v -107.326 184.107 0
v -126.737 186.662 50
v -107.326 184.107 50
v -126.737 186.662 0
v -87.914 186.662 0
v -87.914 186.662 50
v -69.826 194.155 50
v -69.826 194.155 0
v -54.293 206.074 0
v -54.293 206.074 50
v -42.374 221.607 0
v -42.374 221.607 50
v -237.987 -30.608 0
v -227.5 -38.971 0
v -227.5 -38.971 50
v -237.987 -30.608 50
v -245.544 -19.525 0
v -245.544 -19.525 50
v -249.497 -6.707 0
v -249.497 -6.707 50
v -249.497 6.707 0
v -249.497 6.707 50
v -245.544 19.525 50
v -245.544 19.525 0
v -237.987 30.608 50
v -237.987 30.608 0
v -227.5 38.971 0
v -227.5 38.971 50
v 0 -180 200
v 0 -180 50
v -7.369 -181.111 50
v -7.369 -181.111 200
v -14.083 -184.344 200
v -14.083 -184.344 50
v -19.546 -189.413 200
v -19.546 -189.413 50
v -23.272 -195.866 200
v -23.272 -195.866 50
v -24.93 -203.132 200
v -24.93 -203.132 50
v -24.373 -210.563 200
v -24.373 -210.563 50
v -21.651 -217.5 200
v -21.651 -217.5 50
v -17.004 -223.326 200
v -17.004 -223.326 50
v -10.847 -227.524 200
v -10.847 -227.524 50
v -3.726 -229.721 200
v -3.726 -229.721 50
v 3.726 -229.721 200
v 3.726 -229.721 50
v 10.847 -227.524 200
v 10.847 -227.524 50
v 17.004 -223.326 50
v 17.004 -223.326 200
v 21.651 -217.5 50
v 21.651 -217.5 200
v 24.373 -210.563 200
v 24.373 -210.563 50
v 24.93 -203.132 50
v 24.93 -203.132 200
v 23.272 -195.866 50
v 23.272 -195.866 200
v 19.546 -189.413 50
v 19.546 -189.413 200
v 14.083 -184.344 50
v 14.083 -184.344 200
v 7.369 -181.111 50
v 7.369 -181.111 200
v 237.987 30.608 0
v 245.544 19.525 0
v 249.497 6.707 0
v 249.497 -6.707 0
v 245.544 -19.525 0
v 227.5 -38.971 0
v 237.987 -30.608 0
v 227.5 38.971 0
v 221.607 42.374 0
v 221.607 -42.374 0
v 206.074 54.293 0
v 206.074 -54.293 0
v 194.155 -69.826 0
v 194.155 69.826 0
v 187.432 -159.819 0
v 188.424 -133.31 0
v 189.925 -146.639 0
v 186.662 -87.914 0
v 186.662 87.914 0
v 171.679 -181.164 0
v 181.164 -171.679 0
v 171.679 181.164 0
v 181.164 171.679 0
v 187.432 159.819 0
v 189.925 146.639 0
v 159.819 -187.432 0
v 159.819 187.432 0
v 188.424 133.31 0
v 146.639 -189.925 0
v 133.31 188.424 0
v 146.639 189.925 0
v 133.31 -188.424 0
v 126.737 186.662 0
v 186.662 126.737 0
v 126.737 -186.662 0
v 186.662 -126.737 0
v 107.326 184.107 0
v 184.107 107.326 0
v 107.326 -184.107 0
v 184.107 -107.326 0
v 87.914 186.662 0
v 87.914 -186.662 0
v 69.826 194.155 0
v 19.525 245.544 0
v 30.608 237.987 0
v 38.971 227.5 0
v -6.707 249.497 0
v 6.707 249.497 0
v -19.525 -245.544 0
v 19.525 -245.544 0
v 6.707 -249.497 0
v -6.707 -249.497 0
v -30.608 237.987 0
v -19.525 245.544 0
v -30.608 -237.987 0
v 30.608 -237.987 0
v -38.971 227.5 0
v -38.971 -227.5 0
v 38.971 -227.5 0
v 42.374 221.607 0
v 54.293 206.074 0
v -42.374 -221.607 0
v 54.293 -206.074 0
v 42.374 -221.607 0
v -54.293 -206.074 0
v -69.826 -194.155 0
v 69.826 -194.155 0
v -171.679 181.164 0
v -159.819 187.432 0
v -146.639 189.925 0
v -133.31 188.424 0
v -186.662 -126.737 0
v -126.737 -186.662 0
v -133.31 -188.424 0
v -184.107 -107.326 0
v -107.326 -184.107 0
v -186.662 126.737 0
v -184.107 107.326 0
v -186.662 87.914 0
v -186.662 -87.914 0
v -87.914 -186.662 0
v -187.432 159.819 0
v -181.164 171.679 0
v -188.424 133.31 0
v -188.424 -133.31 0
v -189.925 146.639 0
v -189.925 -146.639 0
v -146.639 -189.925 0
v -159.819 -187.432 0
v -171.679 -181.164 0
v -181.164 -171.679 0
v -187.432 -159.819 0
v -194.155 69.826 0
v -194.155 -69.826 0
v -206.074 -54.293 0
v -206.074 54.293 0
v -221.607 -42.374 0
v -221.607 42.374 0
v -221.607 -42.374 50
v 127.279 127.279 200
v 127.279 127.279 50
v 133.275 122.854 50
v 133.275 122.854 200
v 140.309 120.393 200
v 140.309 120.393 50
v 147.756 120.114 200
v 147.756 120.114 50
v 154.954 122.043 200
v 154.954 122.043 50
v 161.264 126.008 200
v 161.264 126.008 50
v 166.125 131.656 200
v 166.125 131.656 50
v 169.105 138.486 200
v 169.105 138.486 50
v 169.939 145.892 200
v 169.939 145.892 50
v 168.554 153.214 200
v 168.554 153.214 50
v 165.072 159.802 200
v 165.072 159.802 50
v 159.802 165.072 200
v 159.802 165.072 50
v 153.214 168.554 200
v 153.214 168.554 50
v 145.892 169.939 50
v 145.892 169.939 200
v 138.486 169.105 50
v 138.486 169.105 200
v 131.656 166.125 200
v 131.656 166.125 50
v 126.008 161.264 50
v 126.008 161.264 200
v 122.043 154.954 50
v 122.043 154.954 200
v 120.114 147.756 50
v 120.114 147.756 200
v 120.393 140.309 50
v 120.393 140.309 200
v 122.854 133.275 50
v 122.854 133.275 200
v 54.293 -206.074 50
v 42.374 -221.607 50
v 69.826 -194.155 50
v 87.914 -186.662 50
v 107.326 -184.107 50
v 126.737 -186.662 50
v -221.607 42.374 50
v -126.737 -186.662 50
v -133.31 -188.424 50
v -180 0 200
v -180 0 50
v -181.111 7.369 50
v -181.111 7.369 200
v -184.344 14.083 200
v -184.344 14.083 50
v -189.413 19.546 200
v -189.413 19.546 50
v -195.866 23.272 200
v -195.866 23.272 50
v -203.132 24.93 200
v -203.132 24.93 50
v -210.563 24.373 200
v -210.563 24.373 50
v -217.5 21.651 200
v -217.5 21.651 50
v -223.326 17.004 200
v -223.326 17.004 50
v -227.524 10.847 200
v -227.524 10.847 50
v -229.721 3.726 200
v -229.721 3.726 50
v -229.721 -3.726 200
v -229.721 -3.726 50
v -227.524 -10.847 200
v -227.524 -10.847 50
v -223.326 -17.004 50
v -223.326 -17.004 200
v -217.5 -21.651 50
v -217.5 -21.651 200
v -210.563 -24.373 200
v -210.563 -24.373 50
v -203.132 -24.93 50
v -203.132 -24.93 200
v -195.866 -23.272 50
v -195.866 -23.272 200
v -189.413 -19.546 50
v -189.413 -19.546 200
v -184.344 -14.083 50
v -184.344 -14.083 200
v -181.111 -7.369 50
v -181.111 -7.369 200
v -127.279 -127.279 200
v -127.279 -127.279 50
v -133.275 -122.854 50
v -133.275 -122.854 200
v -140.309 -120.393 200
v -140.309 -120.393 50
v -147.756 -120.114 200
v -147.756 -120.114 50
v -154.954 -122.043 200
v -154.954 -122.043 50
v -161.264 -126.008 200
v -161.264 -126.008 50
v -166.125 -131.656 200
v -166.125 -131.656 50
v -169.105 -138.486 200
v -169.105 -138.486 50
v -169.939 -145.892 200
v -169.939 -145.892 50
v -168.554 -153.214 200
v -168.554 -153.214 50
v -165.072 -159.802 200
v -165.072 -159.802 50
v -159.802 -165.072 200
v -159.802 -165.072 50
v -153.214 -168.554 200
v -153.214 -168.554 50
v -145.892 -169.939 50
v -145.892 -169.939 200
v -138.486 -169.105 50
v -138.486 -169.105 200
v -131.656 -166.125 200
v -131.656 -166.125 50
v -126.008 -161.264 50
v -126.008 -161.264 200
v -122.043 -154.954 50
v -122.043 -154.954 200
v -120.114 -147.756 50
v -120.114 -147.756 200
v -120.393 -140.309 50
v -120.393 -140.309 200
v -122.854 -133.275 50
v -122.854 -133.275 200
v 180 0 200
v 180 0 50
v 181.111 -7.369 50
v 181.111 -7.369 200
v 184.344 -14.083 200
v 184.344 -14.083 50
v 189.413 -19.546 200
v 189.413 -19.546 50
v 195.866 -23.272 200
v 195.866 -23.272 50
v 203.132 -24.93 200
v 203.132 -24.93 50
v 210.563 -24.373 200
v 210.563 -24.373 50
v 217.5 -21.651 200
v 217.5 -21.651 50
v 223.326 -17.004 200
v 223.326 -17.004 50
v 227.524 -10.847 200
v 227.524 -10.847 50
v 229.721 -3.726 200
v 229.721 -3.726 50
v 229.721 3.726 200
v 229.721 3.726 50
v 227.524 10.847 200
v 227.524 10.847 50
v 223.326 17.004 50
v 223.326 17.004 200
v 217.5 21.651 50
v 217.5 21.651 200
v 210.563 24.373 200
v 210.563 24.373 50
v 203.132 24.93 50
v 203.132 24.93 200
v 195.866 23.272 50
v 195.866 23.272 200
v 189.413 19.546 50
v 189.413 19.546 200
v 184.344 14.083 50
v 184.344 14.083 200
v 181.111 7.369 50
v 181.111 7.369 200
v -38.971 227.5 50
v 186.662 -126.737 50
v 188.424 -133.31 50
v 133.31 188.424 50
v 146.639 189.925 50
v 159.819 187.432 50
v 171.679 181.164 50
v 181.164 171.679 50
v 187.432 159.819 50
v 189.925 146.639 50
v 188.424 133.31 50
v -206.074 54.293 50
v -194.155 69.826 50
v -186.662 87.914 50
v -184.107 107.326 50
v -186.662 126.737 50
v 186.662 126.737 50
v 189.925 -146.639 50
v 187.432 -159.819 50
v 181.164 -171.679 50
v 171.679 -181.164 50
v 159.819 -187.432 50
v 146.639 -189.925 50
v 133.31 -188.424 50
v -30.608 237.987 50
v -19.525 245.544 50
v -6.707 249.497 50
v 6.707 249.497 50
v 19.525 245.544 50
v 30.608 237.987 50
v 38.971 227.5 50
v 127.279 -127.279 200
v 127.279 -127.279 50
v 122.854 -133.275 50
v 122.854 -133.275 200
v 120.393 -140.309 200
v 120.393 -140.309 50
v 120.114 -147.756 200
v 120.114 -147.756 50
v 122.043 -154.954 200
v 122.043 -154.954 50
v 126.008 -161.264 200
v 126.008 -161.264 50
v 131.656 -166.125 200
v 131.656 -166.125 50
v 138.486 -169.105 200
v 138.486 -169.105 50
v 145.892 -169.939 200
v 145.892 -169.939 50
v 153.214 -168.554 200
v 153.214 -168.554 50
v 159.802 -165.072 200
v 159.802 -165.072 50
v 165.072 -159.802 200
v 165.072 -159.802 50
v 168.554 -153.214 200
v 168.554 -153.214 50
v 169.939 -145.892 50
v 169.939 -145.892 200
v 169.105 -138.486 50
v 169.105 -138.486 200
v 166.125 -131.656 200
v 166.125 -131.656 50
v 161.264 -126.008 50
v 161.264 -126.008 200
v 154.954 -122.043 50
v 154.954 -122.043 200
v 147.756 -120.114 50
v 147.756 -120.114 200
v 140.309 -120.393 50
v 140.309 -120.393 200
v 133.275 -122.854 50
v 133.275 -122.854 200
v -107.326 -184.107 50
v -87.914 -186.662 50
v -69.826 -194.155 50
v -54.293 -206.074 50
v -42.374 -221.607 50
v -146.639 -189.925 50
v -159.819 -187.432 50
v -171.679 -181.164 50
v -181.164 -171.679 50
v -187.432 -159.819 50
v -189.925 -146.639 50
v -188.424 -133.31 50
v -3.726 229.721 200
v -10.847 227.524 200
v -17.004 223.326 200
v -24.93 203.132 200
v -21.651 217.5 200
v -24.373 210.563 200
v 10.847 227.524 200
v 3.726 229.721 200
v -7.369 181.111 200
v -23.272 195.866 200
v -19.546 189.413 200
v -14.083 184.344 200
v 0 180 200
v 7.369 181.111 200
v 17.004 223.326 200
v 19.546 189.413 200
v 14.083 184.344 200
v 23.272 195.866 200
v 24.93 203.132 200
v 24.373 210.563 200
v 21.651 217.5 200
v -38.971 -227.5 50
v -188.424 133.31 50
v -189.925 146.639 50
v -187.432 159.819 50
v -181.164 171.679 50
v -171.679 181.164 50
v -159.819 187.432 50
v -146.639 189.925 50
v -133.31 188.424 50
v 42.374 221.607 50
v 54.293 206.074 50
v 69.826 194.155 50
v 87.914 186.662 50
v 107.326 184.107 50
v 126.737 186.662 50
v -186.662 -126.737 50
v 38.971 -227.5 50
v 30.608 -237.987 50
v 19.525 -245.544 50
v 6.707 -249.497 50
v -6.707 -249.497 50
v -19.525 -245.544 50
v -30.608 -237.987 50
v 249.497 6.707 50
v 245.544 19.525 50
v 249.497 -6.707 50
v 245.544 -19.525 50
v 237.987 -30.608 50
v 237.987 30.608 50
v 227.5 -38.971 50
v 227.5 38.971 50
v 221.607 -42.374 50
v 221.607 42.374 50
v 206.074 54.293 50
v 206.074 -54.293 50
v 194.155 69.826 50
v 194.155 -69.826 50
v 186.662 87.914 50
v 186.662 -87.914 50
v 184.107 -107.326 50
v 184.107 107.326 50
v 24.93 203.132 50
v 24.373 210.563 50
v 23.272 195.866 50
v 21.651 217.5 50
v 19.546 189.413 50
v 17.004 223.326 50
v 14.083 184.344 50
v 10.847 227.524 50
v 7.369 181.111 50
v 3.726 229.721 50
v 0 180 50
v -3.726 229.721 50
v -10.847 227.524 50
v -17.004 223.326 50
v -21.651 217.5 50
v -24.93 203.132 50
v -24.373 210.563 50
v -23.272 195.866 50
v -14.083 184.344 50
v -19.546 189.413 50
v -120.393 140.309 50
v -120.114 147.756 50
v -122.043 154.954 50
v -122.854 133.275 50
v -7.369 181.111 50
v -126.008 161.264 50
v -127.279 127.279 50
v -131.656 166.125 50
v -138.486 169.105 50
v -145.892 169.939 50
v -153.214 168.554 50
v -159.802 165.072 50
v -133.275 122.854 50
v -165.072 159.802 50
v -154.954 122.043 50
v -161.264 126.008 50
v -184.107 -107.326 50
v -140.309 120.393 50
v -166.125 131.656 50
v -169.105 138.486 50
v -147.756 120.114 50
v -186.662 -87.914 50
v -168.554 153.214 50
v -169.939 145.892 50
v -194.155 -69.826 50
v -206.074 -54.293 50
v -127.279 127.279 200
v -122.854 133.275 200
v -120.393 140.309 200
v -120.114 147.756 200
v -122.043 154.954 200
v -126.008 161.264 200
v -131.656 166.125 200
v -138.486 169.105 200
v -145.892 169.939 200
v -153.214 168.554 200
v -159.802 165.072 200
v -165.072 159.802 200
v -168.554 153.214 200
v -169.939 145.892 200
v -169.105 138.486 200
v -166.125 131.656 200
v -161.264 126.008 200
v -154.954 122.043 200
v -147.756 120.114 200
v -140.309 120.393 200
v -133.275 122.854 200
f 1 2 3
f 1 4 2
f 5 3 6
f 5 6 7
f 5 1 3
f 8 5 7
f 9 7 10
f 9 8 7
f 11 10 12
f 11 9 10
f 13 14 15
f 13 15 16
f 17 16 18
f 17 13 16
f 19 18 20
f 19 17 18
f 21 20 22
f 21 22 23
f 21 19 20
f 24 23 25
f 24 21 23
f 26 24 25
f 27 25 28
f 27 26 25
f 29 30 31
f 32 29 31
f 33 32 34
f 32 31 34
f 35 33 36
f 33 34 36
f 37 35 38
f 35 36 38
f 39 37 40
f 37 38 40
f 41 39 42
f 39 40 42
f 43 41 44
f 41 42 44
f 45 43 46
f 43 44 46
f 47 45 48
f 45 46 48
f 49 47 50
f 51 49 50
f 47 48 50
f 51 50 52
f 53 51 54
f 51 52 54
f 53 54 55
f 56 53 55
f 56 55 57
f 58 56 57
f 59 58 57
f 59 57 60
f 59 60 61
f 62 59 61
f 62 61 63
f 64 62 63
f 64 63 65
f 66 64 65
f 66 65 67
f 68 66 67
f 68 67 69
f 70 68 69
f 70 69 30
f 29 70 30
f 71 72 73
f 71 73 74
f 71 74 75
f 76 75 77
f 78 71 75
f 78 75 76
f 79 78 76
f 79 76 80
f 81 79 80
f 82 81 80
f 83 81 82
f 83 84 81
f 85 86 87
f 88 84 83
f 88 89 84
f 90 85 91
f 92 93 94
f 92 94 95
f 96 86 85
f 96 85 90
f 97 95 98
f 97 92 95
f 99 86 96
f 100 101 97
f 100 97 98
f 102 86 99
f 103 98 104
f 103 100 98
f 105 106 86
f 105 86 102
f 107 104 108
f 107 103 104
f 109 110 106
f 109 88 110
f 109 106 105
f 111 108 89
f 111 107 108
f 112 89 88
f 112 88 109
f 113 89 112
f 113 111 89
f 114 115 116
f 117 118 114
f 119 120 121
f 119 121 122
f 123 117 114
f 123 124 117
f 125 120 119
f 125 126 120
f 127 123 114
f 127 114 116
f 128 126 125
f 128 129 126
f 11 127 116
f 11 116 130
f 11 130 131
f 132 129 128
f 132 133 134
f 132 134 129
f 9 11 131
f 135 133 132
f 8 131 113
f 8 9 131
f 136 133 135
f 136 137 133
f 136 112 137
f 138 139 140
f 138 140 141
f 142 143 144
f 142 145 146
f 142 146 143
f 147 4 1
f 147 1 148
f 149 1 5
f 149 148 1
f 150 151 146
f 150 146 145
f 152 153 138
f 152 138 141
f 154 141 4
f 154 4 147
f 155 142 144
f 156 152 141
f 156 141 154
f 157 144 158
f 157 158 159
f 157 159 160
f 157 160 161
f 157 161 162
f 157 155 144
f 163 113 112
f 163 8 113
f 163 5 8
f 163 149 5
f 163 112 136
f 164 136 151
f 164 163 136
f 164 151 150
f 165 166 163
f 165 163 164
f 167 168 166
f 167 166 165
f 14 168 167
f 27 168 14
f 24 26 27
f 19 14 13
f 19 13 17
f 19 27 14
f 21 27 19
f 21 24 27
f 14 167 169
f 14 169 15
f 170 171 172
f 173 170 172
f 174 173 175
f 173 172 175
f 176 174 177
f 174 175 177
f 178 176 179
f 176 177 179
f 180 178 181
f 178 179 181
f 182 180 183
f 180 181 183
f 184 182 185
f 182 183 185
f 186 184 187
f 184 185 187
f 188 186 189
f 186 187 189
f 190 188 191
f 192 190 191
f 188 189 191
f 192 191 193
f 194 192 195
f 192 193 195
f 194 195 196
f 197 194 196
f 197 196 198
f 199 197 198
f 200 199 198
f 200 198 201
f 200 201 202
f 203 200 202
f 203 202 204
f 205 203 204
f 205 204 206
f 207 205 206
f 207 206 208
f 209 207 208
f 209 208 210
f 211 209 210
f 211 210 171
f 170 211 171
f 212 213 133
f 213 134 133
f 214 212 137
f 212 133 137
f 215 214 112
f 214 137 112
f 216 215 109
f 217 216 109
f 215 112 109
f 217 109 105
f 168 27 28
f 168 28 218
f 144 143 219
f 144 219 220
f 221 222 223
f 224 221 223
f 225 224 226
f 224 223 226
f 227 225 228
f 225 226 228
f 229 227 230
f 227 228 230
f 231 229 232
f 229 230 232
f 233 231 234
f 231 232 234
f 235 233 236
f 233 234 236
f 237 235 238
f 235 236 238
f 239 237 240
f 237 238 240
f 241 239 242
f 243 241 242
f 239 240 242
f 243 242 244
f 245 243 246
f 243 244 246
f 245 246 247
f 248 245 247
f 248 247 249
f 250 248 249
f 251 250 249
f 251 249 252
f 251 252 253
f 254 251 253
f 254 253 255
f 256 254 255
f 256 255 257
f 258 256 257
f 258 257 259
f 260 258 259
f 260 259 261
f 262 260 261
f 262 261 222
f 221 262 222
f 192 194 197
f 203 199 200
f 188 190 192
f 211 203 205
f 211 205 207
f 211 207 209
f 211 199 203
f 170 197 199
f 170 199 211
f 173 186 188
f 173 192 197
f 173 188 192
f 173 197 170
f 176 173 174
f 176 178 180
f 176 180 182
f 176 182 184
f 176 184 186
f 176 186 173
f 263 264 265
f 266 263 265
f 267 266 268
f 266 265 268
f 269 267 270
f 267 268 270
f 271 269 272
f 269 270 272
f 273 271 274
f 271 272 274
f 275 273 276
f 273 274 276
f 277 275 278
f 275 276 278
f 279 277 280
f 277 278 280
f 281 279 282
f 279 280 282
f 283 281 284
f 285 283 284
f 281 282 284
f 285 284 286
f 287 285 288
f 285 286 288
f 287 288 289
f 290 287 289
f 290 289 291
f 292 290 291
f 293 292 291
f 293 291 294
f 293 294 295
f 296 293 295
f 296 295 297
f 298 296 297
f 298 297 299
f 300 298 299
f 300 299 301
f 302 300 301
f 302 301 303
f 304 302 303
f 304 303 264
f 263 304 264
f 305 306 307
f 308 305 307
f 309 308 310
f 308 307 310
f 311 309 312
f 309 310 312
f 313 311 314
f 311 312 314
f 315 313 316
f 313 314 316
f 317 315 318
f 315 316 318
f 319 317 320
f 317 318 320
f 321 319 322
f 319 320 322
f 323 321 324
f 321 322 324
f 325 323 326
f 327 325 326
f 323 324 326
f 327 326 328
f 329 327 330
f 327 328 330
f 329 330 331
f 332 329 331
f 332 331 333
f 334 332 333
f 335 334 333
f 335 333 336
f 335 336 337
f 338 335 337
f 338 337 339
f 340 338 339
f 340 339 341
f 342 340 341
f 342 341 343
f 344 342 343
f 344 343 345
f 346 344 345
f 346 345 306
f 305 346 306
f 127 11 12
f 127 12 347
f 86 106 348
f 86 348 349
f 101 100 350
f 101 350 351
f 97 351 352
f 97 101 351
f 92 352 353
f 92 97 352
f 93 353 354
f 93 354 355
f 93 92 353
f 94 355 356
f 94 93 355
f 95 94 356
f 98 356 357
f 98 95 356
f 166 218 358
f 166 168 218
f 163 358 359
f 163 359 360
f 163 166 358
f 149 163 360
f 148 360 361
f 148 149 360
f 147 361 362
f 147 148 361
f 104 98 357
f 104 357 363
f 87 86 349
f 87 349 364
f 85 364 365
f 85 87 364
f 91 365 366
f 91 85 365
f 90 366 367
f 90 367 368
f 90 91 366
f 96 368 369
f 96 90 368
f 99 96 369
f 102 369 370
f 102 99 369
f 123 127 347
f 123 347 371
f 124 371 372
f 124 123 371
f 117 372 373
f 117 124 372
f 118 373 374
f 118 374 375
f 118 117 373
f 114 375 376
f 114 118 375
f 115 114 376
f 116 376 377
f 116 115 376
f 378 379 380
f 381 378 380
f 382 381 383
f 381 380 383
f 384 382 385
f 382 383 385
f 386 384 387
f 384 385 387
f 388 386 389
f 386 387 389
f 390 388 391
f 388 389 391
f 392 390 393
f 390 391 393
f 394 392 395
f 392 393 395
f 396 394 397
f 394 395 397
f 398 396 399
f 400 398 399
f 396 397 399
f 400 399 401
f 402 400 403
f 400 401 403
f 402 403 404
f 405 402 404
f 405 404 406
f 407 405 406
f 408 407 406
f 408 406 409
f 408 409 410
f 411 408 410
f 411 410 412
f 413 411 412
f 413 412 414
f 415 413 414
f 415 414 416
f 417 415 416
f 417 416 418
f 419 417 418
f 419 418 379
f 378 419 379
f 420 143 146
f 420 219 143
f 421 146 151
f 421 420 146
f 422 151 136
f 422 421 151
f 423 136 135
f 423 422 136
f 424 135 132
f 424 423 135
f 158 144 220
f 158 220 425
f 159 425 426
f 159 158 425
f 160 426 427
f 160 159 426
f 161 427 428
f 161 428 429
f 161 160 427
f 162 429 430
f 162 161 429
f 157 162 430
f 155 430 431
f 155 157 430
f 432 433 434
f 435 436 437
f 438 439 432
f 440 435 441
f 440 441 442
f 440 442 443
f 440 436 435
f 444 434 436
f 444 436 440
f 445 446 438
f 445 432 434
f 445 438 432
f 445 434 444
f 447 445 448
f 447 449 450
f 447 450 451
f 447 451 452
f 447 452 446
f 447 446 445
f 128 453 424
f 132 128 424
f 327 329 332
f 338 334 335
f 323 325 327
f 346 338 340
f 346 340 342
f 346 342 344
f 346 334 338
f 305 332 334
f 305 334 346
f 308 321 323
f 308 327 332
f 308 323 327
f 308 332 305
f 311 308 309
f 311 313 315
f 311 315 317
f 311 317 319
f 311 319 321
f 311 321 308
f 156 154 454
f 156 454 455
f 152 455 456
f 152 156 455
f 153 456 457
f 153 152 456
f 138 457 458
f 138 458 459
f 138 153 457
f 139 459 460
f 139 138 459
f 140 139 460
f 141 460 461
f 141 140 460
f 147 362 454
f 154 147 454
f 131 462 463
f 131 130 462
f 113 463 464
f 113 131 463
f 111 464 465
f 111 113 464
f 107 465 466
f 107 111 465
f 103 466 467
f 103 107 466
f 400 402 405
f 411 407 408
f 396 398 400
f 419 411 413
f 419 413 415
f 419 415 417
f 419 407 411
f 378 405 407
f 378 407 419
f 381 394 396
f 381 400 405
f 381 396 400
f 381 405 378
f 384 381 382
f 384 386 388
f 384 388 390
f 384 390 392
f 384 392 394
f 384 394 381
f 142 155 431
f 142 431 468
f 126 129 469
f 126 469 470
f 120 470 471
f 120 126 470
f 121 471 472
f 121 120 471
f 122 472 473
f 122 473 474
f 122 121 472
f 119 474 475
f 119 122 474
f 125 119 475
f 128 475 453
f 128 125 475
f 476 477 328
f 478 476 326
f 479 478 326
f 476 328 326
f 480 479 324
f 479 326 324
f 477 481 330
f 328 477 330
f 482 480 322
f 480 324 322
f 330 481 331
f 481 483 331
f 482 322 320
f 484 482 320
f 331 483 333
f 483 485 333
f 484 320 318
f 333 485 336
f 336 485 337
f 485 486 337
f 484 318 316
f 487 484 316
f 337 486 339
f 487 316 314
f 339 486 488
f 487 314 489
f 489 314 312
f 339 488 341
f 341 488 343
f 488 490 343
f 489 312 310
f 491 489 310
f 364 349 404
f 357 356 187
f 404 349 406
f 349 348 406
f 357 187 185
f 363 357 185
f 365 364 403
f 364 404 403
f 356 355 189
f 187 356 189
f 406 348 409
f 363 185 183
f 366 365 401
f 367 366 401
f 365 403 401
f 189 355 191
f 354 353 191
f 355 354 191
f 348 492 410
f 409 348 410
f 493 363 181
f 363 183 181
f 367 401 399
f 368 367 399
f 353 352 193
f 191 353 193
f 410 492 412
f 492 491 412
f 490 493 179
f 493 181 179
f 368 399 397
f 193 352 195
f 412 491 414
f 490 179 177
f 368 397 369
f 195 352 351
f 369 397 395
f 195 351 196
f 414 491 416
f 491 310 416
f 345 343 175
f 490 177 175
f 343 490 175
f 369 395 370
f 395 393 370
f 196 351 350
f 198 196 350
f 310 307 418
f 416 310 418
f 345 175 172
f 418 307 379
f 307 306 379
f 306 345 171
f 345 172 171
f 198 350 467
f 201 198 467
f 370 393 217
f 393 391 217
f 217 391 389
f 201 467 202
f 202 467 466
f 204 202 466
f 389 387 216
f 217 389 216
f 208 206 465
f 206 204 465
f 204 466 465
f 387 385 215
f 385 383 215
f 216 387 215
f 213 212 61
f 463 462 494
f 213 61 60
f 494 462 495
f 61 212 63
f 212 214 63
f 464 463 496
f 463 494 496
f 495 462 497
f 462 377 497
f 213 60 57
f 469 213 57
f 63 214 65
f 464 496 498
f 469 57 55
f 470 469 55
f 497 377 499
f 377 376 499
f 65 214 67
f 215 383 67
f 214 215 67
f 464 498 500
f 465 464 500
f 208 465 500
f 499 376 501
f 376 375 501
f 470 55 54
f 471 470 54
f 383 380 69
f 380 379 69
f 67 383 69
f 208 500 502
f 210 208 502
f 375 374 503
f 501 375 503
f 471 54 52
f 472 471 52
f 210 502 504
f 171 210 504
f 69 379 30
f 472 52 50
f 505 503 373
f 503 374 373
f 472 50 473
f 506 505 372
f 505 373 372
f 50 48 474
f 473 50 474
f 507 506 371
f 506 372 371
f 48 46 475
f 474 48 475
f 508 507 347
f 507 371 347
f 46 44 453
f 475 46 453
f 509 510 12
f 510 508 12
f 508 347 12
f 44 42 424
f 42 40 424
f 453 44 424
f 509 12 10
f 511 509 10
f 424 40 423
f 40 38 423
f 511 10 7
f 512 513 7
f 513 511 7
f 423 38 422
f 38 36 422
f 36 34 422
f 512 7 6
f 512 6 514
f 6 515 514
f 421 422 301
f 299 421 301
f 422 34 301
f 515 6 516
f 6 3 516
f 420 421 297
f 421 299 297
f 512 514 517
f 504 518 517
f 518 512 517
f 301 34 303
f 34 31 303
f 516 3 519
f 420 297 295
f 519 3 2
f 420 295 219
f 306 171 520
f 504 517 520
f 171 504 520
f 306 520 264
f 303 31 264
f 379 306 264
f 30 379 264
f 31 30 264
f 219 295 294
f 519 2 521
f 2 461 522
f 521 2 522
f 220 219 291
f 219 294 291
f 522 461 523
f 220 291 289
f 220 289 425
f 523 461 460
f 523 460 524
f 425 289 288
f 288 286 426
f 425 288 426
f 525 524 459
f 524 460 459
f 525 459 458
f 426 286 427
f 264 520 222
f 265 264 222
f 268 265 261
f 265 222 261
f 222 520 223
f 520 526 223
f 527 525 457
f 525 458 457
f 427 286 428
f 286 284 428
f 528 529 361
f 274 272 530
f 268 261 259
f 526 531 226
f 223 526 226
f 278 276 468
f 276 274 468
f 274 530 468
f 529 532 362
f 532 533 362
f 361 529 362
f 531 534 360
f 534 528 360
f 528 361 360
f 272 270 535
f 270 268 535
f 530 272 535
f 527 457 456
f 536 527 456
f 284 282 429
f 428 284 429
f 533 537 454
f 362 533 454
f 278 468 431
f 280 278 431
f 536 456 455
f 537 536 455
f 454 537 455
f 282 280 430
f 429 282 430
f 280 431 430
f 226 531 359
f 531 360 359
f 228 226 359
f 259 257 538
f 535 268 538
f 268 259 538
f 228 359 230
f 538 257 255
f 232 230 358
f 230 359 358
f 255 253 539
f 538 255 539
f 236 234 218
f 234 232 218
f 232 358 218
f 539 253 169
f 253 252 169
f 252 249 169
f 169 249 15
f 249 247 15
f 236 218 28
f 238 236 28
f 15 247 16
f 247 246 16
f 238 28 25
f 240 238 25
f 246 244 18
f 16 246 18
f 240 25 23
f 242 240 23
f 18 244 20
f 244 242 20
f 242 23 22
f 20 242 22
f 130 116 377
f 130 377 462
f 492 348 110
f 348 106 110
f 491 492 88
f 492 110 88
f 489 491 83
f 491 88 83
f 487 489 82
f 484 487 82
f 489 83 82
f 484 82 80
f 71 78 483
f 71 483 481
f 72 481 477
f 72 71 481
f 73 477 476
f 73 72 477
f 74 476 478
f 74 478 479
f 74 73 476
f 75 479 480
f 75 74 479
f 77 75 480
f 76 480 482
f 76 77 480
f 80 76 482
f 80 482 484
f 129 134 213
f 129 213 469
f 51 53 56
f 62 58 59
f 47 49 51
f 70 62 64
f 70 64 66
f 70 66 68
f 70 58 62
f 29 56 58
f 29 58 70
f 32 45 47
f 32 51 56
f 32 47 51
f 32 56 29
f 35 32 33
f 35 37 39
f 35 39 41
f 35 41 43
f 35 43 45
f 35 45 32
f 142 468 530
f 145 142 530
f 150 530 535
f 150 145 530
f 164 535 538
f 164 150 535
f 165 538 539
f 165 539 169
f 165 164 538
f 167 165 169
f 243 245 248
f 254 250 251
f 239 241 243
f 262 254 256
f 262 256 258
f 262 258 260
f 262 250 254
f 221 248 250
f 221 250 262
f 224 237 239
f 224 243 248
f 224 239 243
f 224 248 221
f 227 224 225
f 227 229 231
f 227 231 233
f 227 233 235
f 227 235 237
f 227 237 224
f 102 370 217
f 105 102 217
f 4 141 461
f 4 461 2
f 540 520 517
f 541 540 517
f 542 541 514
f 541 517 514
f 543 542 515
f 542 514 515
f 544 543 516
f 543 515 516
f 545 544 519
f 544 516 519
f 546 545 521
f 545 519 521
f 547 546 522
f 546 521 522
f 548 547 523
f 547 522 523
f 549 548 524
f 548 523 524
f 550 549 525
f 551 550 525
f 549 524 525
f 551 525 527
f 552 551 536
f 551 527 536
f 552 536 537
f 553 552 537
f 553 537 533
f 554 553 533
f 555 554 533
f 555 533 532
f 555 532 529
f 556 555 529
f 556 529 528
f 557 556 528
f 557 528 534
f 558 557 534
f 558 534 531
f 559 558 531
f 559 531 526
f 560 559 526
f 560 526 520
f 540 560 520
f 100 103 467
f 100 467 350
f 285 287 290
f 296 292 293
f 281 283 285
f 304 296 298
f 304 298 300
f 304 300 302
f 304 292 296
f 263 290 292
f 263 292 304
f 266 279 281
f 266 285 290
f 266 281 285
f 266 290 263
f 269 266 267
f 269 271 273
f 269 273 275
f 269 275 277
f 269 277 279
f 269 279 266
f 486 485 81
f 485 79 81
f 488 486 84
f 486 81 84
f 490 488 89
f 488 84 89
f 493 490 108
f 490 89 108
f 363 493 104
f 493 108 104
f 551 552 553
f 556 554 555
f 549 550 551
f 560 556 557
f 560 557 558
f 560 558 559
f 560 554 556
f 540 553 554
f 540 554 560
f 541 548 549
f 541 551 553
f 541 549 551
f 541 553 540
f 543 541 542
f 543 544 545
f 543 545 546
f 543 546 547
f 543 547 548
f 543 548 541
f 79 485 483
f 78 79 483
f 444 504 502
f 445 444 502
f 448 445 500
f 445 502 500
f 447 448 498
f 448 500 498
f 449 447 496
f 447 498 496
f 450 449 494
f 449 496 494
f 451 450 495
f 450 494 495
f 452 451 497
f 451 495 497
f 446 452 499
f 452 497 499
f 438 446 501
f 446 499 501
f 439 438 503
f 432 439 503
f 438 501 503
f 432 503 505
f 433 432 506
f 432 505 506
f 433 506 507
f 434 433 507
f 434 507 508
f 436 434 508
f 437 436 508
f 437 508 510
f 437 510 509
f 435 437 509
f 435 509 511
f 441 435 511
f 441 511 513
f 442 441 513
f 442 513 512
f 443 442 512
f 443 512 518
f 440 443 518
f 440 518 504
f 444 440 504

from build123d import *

# Parameters (mm, degrees)
SKETCH2_R           = 25
PINION_DEPTH        = 200
PINION_BASE_DEPTH   = 50
CIRPATTERN1_COUNT   = 8
SKETCH1_R           = 180
BOSS_EXTRUDE1_DEPTH = 50
FILLET1_R           = 75


with BuildPart() as part:
    # Sketch2 → pinion (new body)
    with BuildSketch(Plane(origin=(0, 0, 0), x_dir=(0, 1, 0), z_dir=(0, 0, 1))):
        with Locations((-205, 0)):
            Circle(SKETCH2_R)
    extrude(amount=PINION_DEPTH)

    # Sketch2<3> → pinion base (add)
    with BuildSketch(Plane(origin=(0, 0, 0), x_dir=(0, 1, 0), z_dir=(0, 0, 1))):
        with BuildLine():
            Line((-227.5, 38.97114317), (-84.370095606, 121.607232002))
            Line((-84.370095606, 121.607232002), (-84.370095606, -121.607232002))
            Line((-84.370095606, -121.607232002), (-227.5, -38.97114317))
            ThreePointArc((-227.5, -38.97114317), (-250, 0), (-227.5, 38.97114317))
        make_face()
    extrude(amount=PINION_BASE_DEPTH)


with BuildPart() as cirpattern1_1:
    # CirPattern1: pattern copy
    add(part.part.rotate(Axis((0, 0, 210), (0, 0, -1)), 1 * 360 / CIRPATTERN1_COUNT))


with BuildPart() as cirpattern1_2:
    # CirPattern1: pattern copy
    add(part.part.rotate(Axis((0, 0, 210), (0, 0, -1)), 2 * 360 / CIRPATTERN1_COUNT))


with BuildPart() as cirpattern1_3:
    # CirPattern1: pattern copy
    add(part.part.rotate(Axis((0, 0, 210), (0, 0, -1)), 3 * 360 / CIRPATTERN1_COUNT))


with BuildPart() as cirpattern1_4:
    # CirPattern1: pattern copy
    add(part.part.rotate(Axis((0, 0, 210), (0, 0, -1)), 4 * 360 / CIRPATTERN1_COUNT))


with BuildPart() as cirpattern1_5:
    # CirPattern1: pattern copy
    add(part.part.rotate(Axis((0, 0, 210), (0, 0, -1)), 5 * 360 / CIRPATTERN1_COUNT))


with BuildPart() as cirpattern1_6:
    # CirPattern1: pattern copy
    add(part.part.rotate(Axis((0, 0, 210), (0, 0, -1)), 6 * 360 / CIRPATTERN1_COUNT))


with BuildPart() as cirpattern1_7:
    # CirPattern1: pattern copy
    add(part.part.rotate(Axis((0, 0, 210), (0, 0, -1)), 7 * 360 / CIRPATTERN1_COUNT))


with BuildPart() as part_1:
    add(part.part)

    add(cirpattern1_1.part)  # Boss-Extrude1 merges CirPattern1_1

    add(cirpattern1_2.part)  # Boss-Extrude1 merges CirPattern1_2

    add(cirpattern1_3.part)  # Boss-Extrude1 merges CirPattern1_3

    add(cirpattern1_4.part)  # Boss-Extrude1 merges CirPattern1_4

    add(cirpattern1_5.part)  # Boss-Extrude1 merges CirPattern1_5

    add(cirpattern1_6.part)  # Boss-Extrude1 merges CirPattern1_6

    add(cirpattern1_7.part)  # Boss-Extrude1 merges CirPattern1_7
    # Sketch1 → Boss-Extrude1 (add)
    with BuildSketch(Plane(origin=(0, 0, 0), x_dir=(0, 1, 0), z_dir=(0, 0, 1))):
        Circle(SKETCH1_R)
    extrude(amount=BOSS_EXTRUDE1_DEPTH)

    # Fillet1
    fillet1_edges = [part_1.edges().sort_by_distance(p)[0] for p in [
        (-71.148381695, -171.767388028, 25),
        (71.148381695, -171.767388028, 25),
        (171.767388028, -71.148381695, 25),
        (171.767388028, 71.148381695, 25),
        (71.148381695, 171.767388028, 25),
        (-71.148381695, 171.767388028, 25),
        (-171.767388028, 71.148381695, 25),
        (-171.767388028, -71.148381695, 25),
    ]]
    fillet(fillet1_edges, radius=FILLET1_R)


solid = part_1.part
